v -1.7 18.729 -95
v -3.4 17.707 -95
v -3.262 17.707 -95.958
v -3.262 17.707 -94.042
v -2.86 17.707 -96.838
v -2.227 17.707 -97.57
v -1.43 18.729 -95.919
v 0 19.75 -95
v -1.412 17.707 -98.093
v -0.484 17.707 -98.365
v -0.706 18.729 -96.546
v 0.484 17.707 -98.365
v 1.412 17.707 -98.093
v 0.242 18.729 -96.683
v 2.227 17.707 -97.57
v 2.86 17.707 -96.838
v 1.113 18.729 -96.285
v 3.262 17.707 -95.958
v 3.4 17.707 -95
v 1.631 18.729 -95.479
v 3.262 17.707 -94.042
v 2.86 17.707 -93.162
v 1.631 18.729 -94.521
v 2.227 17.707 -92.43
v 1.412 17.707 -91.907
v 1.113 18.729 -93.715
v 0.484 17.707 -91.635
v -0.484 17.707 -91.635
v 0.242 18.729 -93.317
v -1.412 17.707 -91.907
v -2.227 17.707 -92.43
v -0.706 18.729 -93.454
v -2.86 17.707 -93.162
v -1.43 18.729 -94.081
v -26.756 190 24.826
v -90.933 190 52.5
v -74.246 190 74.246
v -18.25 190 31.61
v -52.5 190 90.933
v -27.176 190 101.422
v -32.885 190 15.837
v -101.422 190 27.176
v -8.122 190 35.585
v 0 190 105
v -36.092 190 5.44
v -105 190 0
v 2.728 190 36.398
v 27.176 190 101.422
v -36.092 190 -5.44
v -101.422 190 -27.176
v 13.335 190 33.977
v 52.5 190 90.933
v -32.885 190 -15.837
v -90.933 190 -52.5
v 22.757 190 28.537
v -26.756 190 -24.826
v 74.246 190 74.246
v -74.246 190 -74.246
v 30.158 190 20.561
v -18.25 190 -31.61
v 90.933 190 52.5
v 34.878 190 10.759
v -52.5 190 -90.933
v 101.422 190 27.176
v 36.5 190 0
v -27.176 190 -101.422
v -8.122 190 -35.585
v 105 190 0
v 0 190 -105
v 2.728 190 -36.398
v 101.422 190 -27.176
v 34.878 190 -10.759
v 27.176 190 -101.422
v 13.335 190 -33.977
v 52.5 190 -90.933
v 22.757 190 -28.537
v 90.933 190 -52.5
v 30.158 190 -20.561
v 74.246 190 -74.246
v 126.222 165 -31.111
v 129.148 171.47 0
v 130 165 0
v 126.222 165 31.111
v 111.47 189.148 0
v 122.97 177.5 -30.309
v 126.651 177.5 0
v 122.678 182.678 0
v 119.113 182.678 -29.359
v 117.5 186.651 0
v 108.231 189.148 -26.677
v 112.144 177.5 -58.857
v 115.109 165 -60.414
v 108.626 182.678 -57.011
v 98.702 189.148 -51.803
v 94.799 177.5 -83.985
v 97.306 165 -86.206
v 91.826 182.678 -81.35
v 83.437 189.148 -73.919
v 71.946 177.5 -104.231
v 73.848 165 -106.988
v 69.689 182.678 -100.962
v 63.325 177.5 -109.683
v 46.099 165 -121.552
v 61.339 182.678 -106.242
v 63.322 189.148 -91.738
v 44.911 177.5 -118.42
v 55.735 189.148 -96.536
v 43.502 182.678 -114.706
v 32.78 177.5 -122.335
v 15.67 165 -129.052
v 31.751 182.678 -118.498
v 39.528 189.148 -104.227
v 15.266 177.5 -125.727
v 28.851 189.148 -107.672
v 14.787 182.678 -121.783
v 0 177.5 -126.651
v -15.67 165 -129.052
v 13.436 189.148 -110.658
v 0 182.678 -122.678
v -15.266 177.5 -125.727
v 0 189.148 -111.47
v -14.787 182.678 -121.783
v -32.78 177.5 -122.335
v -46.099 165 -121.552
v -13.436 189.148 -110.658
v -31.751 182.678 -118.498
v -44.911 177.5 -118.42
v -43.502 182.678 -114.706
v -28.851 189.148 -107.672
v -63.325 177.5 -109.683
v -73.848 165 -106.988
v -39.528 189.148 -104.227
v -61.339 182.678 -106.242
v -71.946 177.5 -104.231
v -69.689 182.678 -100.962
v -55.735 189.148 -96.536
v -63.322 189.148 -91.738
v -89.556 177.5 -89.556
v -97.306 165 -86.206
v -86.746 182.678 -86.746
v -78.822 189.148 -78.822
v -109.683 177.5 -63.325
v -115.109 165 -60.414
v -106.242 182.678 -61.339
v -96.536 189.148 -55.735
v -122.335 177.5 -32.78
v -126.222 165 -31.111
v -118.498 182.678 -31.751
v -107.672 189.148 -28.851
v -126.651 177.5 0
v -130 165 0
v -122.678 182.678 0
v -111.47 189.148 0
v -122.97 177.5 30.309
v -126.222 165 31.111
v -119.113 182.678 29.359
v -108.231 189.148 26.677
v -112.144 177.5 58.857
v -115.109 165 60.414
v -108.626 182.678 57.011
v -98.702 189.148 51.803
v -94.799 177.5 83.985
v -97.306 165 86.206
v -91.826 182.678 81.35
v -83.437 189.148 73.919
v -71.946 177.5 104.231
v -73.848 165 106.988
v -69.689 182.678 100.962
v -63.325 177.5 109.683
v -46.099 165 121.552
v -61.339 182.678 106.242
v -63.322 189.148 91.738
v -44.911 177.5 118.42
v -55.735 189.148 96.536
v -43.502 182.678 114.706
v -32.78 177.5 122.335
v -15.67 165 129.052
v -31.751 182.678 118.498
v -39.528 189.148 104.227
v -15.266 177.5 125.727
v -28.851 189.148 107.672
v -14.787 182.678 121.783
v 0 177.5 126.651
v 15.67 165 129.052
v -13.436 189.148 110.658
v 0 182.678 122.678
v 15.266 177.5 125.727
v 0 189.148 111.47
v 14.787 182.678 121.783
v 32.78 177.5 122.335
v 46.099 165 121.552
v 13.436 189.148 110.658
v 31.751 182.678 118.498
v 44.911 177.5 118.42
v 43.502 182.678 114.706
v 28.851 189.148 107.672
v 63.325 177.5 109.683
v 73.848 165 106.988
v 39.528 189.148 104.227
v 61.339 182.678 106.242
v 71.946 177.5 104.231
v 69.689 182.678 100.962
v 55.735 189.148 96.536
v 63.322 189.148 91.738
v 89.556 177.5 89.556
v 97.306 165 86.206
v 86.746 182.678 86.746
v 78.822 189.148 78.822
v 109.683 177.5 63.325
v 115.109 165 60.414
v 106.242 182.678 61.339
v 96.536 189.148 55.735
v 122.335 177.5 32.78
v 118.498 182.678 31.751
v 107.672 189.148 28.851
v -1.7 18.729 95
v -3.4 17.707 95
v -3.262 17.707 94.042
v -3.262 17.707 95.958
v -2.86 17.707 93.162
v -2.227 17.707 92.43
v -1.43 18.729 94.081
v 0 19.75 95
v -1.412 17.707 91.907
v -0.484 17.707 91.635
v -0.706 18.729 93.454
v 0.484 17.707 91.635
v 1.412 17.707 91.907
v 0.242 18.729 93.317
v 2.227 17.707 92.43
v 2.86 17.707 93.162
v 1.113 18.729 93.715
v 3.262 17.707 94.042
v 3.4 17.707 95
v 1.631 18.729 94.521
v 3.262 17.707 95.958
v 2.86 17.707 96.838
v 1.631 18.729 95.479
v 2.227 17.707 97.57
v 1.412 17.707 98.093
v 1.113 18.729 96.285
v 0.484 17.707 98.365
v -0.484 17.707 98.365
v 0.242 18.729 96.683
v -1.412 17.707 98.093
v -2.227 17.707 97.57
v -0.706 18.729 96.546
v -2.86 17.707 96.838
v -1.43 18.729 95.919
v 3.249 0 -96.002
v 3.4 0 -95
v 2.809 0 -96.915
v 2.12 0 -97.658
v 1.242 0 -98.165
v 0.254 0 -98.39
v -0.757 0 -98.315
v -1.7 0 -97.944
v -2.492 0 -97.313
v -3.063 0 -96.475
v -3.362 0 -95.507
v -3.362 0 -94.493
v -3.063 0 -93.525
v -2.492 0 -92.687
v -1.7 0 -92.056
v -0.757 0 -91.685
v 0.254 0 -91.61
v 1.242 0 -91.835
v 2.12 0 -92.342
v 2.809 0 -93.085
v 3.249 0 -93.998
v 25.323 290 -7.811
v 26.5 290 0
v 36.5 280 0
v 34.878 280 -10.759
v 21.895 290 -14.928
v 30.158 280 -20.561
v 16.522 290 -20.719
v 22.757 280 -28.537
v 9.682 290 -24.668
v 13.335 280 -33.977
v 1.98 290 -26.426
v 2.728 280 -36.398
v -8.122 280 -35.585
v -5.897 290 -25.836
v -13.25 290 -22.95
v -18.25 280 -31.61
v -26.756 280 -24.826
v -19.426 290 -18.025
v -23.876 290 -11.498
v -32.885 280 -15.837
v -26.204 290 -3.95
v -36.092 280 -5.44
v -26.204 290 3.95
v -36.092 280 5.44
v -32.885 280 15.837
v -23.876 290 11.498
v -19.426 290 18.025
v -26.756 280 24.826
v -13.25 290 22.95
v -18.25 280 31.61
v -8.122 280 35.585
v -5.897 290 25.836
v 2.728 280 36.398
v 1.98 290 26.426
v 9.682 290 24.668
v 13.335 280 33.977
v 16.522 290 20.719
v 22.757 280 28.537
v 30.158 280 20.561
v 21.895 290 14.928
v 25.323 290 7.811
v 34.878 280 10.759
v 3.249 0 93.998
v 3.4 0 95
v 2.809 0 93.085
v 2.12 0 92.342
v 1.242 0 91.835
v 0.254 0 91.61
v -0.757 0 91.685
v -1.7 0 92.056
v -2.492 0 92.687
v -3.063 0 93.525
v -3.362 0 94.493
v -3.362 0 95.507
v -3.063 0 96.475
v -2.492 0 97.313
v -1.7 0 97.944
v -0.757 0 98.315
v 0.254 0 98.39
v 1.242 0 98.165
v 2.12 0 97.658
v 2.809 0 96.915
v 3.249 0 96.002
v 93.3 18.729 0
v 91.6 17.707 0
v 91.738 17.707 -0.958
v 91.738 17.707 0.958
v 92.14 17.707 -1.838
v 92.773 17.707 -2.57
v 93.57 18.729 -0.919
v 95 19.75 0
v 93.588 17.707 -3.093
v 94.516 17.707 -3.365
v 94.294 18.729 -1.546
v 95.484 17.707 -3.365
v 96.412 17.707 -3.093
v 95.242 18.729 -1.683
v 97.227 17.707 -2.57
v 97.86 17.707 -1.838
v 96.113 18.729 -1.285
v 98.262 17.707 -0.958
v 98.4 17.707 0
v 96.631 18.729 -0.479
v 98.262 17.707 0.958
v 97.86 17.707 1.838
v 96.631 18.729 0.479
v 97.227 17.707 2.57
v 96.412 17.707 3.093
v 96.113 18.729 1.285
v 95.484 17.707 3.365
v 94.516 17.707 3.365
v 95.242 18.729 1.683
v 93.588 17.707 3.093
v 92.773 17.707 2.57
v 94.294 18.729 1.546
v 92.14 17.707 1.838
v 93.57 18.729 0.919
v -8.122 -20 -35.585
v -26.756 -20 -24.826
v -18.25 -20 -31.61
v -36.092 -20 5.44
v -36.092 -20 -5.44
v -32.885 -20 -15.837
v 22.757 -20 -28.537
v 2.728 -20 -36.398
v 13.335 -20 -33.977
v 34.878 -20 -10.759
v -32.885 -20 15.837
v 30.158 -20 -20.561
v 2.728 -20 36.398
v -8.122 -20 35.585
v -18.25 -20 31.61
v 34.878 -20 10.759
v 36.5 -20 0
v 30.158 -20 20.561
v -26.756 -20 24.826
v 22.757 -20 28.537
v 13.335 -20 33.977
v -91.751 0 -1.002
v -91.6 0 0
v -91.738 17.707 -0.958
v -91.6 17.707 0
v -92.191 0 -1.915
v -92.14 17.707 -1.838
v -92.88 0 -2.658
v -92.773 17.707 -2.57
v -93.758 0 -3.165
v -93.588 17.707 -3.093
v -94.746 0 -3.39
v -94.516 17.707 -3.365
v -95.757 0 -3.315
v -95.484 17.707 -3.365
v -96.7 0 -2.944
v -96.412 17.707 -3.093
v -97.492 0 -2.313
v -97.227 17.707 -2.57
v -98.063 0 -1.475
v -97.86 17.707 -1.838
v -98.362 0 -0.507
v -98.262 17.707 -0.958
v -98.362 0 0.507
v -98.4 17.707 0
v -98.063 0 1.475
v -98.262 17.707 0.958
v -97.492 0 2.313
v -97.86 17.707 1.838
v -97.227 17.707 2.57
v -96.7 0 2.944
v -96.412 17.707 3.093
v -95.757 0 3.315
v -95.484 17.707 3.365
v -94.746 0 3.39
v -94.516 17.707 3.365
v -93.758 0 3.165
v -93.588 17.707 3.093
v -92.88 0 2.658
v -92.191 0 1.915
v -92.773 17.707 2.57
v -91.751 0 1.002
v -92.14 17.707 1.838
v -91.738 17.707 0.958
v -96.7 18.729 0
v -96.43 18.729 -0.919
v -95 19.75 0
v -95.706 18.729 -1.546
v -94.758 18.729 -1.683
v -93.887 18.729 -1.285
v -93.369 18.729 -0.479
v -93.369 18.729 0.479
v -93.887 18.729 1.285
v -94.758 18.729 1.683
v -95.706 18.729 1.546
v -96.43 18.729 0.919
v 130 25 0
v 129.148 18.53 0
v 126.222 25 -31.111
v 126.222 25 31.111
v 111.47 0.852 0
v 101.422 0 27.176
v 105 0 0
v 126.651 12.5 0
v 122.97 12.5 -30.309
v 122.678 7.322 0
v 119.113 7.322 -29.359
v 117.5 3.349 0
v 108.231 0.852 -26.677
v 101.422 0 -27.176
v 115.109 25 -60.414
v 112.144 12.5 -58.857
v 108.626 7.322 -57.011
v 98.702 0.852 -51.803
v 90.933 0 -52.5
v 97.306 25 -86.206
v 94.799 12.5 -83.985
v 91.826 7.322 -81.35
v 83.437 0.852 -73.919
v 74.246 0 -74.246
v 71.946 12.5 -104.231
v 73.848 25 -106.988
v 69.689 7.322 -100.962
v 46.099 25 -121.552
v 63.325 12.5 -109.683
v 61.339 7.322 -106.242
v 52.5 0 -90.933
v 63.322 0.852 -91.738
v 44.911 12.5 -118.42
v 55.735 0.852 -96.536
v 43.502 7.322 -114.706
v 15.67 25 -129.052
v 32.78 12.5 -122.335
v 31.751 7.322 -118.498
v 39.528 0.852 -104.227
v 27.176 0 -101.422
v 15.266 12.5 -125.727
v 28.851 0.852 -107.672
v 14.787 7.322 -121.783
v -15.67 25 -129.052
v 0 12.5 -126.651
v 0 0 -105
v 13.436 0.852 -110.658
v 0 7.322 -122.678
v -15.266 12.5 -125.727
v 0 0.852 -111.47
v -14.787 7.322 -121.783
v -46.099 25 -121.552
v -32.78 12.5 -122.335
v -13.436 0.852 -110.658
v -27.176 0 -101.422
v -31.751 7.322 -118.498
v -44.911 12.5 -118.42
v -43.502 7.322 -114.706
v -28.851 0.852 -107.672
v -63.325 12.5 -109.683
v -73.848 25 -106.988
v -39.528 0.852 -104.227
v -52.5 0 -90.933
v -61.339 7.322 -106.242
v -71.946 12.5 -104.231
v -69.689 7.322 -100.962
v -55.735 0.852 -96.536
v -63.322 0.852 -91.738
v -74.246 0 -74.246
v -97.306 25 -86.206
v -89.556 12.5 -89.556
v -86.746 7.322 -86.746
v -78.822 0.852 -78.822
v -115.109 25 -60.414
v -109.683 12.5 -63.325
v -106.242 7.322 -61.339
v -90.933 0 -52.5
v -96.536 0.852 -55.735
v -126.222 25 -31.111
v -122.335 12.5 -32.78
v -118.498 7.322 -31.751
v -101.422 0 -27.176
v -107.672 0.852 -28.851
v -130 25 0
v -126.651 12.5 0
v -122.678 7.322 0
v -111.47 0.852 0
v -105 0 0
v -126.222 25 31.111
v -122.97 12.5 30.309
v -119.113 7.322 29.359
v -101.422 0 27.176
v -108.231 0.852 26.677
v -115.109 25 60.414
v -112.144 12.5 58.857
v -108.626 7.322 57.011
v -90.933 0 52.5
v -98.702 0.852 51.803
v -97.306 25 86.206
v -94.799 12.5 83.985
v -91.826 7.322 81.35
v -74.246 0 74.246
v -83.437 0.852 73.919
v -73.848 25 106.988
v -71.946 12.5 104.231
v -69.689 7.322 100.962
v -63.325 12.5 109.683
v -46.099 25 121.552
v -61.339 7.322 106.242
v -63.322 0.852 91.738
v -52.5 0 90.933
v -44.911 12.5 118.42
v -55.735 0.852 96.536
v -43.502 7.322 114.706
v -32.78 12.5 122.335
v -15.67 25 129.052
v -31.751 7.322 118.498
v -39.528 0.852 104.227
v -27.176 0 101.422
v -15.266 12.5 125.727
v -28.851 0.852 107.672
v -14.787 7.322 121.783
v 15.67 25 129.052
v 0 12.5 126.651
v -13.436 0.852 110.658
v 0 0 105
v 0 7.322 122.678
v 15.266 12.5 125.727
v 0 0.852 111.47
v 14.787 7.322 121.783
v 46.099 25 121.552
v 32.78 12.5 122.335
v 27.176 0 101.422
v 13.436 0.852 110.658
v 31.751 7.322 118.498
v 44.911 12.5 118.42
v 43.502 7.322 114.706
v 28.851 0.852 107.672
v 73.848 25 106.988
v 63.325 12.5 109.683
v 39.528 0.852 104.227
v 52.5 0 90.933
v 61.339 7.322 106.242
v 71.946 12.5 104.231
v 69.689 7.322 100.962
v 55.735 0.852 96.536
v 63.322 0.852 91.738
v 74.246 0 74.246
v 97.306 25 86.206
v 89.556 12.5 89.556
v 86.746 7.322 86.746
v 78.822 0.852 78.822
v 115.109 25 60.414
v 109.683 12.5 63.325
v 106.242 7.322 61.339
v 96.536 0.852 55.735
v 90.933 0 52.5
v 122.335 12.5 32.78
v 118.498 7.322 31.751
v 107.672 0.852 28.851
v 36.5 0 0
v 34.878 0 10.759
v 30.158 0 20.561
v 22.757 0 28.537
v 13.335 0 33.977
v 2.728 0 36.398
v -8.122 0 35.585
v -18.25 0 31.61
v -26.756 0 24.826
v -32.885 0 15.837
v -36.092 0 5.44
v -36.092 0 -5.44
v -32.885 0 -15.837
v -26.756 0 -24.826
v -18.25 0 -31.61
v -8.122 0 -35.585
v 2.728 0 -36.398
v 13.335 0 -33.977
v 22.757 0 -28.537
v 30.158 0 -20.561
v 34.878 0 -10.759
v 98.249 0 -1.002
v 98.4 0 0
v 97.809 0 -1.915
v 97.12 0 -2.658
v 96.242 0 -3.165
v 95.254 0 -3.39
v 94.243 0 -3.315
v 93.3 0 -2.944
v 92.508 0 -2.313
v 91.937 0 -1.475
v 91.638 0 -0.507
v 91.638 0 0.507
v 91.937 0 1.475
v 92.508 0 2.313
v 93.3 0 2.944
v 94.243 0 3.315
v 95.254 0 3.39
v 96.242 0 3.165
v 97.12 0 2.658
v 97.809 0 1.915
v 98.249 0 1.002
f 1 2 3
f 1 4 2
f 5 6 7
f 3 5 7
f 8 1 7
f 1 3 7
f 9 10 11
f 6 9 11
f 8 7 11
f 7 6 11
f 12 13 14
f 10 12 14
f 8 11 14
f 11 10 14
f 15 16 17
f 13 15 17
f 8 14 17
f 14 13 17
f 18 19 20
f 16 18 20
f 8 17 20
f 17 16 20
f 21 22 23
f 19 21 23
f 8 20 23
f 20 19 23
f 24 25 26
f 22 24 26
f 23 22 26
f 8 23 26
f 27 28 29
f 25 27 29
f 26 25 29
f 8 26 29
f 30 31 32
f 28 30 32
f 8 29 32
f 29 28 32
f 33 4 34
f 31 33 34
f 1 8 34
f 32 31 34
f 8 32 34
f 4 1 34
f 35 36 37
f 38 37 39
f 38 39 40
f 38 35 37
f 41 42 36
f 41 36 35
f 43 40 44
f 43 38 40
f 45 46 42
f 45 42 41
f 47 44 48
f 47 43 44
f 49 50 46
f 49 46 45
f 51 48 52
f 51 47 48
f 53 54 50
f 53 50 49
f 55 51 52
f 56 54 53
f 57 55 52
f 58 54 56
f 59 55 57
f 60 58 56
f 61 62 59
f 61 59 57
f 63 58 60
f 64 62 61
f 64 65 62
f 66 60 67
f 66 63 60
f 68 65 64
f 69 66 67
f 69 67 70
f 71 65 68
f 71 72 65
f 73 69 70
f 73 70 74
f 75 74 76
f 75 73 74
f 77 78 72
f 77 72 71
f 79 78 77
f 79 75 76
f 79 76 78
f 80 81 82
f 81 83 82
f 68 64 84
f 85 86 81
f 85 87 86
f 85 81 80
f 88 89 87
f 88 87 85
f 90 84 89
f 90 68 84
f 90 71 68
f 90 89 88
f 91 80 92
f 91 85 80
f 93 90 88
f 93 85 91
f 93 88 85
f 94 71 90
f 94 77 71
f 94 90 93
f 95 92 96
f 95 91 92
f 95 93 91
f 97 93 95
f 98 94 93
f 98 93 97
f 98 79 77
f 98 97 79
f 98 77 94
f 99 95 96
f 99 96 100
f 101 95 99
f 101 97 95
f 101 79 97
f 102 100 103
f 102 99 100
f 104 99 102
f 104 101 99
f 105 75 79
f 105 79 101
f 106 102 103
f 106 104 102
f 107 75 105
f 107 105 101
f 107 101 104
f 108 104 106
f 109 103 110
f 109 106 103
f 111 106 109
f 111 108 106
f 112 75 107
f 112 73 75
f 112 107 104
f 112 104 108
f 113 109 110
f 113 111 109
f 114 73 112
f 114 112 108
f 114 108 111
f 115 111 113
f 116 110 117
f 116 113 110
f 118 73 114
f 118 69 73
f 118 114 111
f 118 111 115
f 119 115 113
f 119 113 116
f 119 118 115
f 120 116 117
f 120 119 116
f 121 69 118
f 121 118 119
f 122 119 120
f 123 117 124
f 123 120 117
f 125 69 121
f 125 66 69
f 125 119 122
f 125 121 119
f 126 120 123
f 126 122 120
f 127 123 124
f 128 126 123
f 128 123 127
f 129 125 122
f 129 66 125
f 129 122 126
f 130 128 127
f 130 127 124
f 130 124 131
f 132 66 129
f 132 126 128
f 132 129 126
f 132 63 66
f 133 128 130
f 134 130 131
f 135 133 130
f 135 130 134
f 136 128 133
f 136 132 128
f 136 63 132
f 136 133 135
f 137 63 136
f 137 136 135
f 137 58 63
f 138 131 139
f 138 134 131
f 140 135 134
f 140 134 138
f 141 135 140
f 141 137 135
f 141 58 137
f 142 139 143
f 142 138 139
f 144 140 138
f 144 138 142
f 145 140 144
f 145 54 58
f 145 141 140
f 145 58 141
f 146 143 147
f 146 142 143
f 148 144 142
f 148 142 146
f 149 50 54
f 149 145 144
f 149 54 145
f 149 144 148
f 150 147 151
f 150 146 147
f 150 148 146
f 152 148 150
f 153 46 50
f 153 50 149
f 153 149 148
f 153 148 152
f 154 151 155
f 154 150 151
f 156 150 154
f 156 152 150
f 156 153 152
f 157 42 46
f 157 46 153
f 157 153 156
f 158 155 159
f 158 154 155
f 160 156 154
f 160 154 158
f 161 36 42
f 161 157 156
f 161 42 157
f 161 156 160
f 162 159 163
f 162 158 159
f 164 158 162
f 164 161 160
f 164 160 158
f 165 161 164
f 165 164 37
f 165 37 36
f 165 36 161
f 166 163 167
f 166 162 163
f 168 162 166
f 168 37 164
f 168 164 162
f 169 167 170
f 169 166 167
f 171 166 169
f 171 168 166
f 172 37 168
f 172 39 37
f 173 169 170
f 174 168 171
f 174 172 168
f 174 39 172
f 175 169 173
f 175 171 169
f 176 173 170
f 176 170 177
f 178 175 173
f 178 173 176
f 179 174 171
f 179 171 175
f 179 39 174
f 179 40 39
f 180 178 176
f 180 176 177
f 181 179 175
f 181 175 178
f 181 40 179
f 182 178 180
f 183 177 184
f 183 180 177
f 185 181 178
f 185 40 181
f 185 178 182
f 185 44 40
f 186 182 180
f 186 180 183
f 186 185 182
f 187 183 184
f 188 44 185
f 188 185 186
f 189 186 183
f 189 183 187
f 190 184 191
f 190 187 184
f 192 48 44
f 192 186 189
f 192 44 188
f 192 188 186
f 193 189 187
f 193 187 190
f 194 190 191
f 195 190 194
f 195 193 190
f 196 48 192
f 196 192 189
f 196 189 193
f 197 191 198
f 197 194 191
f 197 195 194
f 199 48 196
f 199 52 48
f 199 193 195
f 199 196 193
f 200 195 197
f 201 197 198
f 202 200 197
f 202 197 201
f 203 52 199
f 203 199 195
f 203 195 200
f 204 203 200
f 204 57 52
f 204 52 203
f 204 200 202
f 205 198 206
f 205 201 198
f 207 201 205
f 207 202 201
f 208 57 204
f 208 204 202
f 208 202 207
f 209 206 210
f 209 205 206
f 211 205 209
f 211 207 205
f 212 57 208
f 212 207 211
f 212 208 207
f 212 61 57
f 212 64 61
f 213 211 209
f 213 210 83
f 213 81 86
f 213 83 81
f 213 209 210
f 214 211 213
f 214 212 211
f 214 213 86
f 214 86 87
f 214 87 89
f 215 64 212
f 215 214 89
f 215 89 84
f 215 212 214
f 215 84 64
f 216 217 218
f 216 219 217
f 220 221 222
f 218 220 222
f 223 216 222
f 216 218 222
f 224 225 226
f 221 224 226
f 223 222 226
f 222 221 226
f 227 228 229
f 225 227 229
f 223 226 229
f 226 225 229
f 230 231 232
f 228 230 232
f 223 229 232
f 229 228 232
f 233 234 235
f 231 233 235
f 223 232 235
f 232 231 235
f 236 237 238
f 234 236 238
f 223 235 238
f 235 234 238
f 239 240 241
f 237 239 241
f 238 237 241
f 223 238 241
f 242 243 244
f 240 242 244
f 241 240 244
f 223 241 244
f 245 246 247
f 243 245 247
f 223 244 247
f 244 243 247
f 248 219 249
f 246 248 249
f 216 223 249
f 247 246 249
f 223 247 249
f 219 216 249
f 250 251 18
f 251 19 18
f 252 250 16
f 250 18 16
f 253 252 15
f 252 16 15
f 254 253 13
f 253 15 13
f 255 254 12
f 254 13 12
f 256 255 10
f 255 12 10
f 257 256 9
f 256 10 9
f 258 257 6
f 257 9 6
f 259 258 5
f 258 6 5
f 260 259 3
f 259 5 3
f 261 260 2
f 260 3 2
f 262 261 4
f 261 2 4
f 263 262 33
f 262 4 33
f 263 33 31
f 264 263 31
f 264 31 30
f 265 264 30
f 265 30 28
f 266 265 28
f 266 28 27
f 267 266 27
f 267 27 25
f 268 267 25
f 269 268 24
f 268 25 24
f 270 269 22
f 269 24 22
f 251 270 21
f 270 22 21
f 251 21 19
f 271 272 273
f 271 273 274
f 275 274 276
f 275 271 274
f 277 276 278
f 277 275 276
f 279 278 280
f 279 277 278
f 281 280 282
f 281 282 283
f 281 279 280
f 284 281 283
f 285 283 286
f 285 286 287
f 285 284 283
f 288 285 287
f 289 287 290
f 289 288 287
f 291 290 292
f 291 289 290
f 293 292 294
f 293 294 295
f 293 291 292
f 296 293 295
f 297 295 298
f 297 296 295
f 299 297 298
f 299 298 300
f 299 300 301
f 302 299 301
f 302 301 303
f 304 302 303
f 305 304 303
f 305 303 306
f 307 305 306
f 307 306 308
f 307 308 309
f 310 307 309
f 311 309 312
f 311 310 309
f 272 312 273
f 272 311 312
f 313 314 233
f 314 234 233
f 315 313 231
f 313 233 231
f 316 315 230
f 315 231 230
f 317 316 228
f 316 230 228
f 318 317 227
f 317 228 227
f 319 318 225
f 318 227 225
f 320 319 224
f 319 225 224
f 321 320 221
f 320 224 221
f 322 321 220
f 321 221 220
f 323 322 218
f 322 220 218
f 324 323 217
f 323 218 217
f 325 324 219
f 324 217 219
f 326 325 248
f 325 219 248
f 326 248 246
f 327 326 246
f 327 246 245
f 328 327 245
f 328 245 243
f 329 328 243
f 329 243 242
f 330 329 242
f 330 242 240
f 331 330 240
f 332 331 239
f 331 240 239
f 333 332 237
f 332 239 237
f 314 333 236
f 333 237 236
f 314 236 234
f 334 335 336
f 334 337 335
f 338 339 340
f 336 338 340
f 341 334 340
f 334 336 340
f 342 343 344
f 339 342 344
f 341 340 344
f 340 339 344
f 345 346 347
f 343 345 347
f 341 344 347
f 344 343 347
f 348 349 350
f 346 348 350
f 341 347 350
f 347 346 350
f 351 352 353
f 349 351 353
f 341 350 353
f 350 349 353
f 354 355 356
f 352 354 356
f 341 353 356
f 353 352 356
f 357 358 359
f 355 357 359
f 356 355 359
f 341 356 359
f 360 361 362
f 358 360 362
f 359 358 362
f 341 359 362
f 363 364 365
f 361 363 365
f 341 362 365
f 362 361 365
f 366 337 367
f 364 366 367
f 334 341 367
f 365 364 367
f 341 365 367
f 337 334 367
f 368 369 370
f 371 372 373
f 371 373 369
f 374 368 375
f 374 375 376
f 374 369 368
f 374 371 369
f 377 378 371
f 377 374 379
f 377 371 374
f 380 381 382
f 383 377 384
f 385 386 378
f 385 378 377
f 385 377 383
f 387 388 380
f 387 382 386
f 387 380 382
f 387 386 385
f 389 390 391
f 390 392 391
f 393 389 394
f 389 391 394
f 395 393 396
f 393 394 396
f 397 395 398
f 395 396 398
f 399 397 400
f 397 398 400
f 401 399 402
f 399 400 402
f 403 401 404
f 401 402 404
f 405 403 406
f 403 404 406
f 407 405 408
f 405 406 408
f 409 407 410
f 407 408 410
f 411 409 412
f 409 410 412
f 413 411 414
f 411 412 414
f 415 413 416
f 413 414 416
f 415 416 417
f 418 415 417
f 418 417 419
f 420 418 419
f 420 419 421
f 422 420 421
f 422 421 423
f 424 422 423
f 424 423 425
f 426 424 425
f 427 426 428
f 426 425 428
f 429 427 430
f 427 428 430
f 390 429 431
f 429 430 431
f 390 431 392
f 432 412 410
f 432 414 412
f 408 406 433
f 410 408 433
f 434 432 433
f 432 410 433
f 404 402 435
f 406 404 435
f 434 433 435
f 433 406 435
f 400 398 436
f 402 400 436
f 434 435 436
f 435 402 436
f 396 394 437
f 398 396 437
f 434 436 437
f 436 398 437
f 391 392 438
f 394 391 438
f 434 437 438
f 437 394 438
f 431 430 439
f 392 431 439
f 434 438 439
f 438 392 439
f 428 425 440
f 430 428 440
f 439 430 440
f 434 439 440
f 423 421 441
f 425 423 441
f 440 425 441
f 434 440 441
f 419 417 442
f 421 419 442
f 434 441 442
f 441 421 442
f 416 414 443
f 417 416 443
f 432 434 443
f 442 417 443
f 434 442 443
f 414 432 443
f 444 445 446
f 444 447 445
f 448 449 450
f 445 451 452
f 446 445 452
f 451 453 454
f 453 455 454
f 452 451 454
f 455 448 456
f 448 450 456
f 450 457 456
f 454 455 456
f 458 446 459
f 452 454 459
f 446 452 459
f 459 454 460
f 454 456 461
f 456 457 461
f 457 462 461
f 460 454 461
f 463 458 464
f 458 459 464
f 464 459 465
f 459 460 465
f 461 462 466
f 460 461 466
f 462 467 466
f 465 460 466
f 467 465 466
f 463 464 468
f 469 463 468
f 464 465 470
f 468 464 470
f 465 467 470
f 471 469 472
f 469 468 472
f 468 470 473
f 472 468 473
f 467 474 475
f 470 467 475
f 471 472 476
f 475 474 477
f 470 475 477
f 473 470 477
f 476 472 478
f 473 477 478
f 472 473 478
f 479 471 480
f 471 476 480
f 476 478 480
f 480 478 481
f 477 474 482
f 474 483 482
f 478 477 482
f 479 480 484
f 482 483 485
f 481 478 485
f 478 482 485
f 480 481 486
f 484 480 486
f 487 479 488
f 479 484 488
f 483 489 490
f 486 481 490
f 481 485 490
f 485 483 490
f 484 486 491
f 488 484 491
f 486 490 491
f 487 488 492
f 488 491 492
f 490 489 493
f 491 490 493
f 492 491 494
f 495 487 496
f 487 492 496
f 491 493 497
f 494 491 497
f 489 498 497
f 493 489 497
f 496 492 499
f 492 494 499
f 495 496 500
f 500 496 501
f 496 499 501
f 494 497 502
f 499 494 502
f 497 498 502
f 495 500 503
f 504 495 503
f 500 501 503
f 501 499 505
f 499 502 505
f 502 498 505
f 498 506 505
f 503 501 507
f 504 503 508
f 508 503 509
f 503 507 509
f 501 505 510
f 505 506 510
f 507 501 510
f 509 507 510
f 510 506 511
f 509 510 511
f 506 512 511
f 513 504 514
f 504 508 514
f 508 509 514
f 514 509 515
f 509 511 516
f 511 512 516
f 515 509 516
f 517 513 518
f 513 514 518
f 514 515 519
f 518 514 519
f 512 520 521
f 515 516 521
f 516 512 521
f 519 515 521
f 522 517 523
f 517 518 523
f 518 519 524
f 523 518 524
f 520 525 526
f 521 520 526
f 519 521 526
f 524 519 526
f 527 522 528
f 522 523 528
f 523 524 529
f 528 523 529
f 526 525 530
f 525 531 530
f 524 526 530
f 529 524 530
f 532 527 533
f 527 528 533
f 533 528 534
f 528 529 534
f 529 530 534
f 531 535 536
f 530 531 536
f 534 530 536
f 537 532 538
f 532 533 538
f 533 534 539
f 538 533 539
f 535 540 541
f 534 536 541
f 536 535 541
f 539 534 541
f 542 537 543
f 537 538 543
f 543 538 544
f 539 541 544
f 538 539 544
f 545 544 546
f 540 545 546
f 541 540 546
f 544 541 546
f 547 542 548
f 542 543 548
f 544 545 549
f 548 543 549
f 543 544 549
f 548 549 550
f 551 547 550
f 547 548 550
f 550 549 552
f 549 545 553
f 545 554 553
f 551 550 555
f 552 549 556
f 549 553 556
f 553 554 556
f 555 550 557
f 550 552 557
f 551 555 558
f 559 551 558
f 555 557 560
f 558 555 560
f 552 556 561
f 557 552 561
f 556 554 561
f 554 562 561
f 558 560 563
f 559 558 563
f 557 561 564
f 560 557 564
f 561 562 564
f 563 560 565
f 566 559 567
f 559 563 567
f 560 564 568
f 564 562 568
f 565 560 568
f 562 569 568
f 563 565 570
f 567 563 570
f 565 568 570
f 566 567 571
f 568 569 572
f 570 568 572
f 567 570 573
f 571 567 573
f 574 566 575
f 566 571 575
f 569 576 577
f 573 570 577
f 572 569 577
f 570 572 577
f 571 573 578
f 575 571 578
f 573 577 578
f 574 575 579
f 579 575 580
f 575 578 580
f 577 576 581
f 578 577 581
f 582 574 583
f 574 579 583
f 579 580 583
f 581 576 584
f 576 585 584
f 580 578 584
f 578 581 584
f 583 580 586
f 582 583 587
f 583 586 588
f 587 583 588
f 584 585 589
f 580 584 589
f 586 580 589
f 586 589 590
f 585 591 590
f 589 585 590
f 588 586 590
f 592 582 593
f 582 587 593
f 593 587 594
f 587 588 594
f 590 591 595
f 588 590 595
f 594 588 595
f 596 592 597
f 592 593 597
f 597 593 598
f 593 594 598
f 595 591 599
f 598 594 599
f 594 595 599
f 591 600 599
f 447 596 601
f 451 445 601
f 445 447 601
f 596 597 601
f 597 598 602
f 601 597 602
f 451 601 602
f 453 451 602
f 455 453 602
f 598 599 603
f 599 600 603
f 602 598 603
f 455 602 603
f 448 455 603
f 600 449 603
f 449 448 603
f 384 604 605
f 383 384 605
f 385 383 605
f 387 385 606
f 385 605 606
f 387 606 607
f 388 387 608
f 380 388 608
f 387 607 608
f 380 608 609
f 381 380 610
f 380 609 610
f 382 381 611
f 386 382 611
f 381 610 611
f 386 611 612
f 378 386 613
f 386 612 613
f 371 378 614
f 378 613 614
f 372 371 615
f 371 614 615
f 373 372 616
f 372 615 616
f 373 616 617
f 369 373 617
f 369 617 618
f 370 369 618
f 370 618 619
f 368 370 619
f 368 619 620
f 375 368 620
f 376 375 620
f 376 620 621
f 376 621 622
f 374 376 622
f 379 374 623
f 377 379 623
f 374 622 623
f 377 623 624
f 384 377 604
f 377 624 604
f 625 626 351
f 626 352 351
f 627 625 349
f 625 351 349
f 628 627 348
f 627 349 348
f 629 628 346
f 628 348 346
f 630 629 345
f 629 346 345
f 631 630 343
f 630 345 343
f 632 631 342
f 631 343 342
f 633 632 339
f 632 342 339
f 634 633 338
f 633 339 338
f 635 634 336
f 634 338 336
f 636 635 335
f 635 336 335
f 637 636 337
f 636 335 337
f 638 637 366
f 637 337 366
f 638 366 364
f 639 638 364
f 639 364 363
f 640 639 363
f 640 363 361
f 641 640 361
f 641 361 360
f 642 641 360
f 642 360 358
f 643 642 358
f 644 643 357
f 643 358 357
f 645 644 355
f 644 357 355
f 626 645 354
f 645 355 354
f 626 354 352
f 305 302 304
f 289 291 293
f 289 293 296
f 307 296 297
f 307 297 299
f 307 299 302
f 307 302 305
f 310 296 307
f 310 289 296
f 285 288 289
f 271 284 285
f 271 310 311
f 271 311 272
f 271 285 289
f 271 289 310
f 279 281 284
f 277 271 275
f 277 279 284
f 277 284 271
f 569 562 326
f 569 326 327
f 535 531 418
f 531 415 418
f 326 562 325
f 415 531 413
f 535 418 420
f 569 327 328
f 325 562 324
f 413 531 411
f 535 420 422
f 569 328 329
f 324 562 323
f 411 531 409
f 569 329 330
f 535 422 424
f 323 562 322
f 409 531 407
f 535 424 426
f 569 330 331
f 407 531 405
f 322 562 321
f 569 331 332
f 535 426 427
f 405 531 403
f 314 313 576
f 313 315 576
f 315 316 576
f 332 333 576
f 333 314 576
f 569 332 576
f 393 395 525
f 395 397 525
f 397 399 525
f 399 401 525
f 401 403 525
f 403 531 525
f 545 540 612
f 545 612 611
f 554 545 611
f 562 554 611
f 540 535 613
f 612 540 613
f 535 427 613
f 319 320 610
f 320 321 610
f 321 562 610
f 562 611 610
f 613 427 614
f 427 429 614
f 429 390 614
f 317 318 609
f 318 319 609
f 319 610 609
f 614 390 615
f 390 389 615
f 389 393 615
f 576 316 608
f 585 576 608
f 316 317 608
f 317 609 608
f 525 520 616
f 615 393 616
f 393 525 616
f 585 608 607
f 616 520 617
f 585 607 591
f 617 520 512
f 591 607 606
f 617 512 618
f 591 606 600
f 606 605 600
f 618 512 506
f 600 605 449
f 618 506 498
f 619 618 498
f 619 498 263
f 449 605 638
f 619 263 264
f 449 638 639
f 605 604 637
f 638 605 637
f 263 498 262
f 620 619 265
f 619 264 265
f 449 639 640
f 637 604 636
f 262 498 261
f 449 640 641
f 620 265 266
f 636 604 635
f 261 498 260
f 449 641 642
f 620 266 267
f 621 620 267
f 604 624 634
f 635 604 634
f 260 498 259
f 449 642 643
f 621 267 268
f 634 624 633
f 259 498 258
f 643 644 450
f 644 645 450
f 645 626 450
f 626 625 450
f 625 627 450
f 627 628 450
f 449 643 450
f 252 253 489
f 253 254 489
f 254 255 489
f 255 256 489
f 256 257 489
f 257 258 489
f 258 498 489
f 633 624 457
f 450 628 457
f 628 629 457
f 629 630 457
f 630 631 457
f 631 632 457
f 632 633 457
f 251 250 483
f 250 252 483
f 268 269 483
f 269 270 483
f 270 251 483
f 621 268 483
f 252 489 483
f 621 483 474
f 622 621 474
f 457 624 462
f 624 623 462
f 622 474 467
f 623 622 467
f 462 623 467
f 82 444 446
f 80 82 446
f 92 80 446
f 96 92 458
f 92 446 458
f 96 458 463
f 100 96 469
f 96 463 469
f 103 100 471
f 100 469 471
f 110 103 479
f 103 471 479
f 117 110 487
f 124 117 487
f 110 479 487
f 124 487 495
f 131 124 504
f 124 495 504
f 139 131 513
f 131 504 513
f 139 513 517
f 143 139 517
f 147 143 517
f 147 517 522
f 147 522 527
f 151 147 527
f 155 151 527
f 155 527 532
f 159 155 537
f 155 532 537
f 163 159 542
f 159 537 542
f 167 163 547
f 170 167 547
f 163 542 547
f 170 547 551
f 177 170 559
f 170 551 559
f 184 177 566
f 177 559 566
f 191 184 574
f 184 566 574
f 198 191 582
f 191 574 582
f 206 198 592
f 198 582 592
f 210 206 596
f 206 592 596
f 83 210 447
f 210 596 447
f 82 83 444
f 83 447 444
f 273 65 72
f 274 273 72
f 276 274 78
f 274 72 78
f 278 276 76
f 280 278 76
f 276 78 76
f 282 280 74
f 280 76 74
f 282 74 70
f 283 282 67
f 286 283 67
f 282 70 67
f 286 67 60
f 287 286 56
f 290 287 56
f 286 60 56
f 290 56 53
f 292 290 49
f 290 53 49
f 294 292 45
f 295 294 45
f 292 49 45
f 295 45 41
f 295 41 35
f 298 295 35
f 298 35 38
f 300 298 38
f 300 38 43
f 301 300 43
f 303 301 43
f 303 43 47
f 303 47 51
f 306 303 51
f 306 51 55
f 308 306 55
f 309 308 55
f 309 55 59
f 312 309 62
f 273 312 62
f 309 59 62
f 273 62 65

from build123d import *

# Parameters (mm, degrees)
SKETCH1_R             = 130
BOSS_EXTRUDE1_DEPTH   = 190
FILLET1_R             = 25
SKETCH2_R             = 36.5
BOSS_EXTRUDE2_DEPTH   = 20
M8_TAPPED_HOLE2_D     = 6.8
M8_TAPPED_HOLE2_DEPTH = 17.707073895
M8_TAPPED_HOLE2_TIP   = 2.042926105
SKETCH8_R             = 36.5
BOSS_EXTRUDE3_DEPTH   = 100
CHAMFER1_SIZE         = 10


with BuildPart() as part:
    # Sketch1 → Boss-Extrude1 (new body)
    with BuildSketch(Plane(origin=(0, 0, 0), x_dir=(1, 0, 0), z_dir=(0, 1, 0))):
        Circle(SKETCH1_R)
    extrude(amount=BOSS_EXTRUDE1_DEPTH)

    # Fillet1
    fillet1_edges = [part.edges().sort_by_distance(p)[0] for p in [
        (-130, 0, 0),
        (-130, 190, 0),
    ]]
    fillet(fillet1_edges, radius=FILLET1_R)

    # Sketch2 → Boss-Extrude2 (add)
    with BuildSketch(Plane.XZ):
        Circle(SKETCH2_R)
    extrude(amount=BOSS_EXTRUDE2_DEPTH)

    # M8 Tapped Hole2
    with Locations(Plane(origin=(0, 0, 0), x_dir=(-1, 0, 0), z_dir=(0, -1, 0))):
        with Locations((0, -95), (-95, 0), (0, 95), (95, 0)):
            Hole(M8_TAPPED_HOLE2_D / 2, depth=M8_TAPPED_HOLE2_DEPTH)
            with Locations((0, 0, -(M8_TAPPED_HOLE2_DEPTH + M8_TAPPED_HOLE2_TIP / 2))):  # 118° drill point
                Cone(0, M8_TAPPED_HOLE2_D / 2, M8_TAPPED_HOLE2_TIP, mode=Mode.SUBTRACT)

    # Sketch8 → Boss-Extrude3 (add)
    with BuildSketch(Plane(origin=(0, 190, 0), x_dir=(1, 0, 0), z_dir=(0, 1, 0))):
        Circle(SKETCH8_R)
    extrude(amount=BOSS_EXTRUDE3_DEPTH)

    # Chamfer1
    chamfer1_edges = [part.edges().sort_by_distance(p)[0] for p in [
        (-36.5, 290, 0),
    ]]
    chamfer(chamfer1_edges, length=CHAMFER1_SIZE)


solid = part.part
